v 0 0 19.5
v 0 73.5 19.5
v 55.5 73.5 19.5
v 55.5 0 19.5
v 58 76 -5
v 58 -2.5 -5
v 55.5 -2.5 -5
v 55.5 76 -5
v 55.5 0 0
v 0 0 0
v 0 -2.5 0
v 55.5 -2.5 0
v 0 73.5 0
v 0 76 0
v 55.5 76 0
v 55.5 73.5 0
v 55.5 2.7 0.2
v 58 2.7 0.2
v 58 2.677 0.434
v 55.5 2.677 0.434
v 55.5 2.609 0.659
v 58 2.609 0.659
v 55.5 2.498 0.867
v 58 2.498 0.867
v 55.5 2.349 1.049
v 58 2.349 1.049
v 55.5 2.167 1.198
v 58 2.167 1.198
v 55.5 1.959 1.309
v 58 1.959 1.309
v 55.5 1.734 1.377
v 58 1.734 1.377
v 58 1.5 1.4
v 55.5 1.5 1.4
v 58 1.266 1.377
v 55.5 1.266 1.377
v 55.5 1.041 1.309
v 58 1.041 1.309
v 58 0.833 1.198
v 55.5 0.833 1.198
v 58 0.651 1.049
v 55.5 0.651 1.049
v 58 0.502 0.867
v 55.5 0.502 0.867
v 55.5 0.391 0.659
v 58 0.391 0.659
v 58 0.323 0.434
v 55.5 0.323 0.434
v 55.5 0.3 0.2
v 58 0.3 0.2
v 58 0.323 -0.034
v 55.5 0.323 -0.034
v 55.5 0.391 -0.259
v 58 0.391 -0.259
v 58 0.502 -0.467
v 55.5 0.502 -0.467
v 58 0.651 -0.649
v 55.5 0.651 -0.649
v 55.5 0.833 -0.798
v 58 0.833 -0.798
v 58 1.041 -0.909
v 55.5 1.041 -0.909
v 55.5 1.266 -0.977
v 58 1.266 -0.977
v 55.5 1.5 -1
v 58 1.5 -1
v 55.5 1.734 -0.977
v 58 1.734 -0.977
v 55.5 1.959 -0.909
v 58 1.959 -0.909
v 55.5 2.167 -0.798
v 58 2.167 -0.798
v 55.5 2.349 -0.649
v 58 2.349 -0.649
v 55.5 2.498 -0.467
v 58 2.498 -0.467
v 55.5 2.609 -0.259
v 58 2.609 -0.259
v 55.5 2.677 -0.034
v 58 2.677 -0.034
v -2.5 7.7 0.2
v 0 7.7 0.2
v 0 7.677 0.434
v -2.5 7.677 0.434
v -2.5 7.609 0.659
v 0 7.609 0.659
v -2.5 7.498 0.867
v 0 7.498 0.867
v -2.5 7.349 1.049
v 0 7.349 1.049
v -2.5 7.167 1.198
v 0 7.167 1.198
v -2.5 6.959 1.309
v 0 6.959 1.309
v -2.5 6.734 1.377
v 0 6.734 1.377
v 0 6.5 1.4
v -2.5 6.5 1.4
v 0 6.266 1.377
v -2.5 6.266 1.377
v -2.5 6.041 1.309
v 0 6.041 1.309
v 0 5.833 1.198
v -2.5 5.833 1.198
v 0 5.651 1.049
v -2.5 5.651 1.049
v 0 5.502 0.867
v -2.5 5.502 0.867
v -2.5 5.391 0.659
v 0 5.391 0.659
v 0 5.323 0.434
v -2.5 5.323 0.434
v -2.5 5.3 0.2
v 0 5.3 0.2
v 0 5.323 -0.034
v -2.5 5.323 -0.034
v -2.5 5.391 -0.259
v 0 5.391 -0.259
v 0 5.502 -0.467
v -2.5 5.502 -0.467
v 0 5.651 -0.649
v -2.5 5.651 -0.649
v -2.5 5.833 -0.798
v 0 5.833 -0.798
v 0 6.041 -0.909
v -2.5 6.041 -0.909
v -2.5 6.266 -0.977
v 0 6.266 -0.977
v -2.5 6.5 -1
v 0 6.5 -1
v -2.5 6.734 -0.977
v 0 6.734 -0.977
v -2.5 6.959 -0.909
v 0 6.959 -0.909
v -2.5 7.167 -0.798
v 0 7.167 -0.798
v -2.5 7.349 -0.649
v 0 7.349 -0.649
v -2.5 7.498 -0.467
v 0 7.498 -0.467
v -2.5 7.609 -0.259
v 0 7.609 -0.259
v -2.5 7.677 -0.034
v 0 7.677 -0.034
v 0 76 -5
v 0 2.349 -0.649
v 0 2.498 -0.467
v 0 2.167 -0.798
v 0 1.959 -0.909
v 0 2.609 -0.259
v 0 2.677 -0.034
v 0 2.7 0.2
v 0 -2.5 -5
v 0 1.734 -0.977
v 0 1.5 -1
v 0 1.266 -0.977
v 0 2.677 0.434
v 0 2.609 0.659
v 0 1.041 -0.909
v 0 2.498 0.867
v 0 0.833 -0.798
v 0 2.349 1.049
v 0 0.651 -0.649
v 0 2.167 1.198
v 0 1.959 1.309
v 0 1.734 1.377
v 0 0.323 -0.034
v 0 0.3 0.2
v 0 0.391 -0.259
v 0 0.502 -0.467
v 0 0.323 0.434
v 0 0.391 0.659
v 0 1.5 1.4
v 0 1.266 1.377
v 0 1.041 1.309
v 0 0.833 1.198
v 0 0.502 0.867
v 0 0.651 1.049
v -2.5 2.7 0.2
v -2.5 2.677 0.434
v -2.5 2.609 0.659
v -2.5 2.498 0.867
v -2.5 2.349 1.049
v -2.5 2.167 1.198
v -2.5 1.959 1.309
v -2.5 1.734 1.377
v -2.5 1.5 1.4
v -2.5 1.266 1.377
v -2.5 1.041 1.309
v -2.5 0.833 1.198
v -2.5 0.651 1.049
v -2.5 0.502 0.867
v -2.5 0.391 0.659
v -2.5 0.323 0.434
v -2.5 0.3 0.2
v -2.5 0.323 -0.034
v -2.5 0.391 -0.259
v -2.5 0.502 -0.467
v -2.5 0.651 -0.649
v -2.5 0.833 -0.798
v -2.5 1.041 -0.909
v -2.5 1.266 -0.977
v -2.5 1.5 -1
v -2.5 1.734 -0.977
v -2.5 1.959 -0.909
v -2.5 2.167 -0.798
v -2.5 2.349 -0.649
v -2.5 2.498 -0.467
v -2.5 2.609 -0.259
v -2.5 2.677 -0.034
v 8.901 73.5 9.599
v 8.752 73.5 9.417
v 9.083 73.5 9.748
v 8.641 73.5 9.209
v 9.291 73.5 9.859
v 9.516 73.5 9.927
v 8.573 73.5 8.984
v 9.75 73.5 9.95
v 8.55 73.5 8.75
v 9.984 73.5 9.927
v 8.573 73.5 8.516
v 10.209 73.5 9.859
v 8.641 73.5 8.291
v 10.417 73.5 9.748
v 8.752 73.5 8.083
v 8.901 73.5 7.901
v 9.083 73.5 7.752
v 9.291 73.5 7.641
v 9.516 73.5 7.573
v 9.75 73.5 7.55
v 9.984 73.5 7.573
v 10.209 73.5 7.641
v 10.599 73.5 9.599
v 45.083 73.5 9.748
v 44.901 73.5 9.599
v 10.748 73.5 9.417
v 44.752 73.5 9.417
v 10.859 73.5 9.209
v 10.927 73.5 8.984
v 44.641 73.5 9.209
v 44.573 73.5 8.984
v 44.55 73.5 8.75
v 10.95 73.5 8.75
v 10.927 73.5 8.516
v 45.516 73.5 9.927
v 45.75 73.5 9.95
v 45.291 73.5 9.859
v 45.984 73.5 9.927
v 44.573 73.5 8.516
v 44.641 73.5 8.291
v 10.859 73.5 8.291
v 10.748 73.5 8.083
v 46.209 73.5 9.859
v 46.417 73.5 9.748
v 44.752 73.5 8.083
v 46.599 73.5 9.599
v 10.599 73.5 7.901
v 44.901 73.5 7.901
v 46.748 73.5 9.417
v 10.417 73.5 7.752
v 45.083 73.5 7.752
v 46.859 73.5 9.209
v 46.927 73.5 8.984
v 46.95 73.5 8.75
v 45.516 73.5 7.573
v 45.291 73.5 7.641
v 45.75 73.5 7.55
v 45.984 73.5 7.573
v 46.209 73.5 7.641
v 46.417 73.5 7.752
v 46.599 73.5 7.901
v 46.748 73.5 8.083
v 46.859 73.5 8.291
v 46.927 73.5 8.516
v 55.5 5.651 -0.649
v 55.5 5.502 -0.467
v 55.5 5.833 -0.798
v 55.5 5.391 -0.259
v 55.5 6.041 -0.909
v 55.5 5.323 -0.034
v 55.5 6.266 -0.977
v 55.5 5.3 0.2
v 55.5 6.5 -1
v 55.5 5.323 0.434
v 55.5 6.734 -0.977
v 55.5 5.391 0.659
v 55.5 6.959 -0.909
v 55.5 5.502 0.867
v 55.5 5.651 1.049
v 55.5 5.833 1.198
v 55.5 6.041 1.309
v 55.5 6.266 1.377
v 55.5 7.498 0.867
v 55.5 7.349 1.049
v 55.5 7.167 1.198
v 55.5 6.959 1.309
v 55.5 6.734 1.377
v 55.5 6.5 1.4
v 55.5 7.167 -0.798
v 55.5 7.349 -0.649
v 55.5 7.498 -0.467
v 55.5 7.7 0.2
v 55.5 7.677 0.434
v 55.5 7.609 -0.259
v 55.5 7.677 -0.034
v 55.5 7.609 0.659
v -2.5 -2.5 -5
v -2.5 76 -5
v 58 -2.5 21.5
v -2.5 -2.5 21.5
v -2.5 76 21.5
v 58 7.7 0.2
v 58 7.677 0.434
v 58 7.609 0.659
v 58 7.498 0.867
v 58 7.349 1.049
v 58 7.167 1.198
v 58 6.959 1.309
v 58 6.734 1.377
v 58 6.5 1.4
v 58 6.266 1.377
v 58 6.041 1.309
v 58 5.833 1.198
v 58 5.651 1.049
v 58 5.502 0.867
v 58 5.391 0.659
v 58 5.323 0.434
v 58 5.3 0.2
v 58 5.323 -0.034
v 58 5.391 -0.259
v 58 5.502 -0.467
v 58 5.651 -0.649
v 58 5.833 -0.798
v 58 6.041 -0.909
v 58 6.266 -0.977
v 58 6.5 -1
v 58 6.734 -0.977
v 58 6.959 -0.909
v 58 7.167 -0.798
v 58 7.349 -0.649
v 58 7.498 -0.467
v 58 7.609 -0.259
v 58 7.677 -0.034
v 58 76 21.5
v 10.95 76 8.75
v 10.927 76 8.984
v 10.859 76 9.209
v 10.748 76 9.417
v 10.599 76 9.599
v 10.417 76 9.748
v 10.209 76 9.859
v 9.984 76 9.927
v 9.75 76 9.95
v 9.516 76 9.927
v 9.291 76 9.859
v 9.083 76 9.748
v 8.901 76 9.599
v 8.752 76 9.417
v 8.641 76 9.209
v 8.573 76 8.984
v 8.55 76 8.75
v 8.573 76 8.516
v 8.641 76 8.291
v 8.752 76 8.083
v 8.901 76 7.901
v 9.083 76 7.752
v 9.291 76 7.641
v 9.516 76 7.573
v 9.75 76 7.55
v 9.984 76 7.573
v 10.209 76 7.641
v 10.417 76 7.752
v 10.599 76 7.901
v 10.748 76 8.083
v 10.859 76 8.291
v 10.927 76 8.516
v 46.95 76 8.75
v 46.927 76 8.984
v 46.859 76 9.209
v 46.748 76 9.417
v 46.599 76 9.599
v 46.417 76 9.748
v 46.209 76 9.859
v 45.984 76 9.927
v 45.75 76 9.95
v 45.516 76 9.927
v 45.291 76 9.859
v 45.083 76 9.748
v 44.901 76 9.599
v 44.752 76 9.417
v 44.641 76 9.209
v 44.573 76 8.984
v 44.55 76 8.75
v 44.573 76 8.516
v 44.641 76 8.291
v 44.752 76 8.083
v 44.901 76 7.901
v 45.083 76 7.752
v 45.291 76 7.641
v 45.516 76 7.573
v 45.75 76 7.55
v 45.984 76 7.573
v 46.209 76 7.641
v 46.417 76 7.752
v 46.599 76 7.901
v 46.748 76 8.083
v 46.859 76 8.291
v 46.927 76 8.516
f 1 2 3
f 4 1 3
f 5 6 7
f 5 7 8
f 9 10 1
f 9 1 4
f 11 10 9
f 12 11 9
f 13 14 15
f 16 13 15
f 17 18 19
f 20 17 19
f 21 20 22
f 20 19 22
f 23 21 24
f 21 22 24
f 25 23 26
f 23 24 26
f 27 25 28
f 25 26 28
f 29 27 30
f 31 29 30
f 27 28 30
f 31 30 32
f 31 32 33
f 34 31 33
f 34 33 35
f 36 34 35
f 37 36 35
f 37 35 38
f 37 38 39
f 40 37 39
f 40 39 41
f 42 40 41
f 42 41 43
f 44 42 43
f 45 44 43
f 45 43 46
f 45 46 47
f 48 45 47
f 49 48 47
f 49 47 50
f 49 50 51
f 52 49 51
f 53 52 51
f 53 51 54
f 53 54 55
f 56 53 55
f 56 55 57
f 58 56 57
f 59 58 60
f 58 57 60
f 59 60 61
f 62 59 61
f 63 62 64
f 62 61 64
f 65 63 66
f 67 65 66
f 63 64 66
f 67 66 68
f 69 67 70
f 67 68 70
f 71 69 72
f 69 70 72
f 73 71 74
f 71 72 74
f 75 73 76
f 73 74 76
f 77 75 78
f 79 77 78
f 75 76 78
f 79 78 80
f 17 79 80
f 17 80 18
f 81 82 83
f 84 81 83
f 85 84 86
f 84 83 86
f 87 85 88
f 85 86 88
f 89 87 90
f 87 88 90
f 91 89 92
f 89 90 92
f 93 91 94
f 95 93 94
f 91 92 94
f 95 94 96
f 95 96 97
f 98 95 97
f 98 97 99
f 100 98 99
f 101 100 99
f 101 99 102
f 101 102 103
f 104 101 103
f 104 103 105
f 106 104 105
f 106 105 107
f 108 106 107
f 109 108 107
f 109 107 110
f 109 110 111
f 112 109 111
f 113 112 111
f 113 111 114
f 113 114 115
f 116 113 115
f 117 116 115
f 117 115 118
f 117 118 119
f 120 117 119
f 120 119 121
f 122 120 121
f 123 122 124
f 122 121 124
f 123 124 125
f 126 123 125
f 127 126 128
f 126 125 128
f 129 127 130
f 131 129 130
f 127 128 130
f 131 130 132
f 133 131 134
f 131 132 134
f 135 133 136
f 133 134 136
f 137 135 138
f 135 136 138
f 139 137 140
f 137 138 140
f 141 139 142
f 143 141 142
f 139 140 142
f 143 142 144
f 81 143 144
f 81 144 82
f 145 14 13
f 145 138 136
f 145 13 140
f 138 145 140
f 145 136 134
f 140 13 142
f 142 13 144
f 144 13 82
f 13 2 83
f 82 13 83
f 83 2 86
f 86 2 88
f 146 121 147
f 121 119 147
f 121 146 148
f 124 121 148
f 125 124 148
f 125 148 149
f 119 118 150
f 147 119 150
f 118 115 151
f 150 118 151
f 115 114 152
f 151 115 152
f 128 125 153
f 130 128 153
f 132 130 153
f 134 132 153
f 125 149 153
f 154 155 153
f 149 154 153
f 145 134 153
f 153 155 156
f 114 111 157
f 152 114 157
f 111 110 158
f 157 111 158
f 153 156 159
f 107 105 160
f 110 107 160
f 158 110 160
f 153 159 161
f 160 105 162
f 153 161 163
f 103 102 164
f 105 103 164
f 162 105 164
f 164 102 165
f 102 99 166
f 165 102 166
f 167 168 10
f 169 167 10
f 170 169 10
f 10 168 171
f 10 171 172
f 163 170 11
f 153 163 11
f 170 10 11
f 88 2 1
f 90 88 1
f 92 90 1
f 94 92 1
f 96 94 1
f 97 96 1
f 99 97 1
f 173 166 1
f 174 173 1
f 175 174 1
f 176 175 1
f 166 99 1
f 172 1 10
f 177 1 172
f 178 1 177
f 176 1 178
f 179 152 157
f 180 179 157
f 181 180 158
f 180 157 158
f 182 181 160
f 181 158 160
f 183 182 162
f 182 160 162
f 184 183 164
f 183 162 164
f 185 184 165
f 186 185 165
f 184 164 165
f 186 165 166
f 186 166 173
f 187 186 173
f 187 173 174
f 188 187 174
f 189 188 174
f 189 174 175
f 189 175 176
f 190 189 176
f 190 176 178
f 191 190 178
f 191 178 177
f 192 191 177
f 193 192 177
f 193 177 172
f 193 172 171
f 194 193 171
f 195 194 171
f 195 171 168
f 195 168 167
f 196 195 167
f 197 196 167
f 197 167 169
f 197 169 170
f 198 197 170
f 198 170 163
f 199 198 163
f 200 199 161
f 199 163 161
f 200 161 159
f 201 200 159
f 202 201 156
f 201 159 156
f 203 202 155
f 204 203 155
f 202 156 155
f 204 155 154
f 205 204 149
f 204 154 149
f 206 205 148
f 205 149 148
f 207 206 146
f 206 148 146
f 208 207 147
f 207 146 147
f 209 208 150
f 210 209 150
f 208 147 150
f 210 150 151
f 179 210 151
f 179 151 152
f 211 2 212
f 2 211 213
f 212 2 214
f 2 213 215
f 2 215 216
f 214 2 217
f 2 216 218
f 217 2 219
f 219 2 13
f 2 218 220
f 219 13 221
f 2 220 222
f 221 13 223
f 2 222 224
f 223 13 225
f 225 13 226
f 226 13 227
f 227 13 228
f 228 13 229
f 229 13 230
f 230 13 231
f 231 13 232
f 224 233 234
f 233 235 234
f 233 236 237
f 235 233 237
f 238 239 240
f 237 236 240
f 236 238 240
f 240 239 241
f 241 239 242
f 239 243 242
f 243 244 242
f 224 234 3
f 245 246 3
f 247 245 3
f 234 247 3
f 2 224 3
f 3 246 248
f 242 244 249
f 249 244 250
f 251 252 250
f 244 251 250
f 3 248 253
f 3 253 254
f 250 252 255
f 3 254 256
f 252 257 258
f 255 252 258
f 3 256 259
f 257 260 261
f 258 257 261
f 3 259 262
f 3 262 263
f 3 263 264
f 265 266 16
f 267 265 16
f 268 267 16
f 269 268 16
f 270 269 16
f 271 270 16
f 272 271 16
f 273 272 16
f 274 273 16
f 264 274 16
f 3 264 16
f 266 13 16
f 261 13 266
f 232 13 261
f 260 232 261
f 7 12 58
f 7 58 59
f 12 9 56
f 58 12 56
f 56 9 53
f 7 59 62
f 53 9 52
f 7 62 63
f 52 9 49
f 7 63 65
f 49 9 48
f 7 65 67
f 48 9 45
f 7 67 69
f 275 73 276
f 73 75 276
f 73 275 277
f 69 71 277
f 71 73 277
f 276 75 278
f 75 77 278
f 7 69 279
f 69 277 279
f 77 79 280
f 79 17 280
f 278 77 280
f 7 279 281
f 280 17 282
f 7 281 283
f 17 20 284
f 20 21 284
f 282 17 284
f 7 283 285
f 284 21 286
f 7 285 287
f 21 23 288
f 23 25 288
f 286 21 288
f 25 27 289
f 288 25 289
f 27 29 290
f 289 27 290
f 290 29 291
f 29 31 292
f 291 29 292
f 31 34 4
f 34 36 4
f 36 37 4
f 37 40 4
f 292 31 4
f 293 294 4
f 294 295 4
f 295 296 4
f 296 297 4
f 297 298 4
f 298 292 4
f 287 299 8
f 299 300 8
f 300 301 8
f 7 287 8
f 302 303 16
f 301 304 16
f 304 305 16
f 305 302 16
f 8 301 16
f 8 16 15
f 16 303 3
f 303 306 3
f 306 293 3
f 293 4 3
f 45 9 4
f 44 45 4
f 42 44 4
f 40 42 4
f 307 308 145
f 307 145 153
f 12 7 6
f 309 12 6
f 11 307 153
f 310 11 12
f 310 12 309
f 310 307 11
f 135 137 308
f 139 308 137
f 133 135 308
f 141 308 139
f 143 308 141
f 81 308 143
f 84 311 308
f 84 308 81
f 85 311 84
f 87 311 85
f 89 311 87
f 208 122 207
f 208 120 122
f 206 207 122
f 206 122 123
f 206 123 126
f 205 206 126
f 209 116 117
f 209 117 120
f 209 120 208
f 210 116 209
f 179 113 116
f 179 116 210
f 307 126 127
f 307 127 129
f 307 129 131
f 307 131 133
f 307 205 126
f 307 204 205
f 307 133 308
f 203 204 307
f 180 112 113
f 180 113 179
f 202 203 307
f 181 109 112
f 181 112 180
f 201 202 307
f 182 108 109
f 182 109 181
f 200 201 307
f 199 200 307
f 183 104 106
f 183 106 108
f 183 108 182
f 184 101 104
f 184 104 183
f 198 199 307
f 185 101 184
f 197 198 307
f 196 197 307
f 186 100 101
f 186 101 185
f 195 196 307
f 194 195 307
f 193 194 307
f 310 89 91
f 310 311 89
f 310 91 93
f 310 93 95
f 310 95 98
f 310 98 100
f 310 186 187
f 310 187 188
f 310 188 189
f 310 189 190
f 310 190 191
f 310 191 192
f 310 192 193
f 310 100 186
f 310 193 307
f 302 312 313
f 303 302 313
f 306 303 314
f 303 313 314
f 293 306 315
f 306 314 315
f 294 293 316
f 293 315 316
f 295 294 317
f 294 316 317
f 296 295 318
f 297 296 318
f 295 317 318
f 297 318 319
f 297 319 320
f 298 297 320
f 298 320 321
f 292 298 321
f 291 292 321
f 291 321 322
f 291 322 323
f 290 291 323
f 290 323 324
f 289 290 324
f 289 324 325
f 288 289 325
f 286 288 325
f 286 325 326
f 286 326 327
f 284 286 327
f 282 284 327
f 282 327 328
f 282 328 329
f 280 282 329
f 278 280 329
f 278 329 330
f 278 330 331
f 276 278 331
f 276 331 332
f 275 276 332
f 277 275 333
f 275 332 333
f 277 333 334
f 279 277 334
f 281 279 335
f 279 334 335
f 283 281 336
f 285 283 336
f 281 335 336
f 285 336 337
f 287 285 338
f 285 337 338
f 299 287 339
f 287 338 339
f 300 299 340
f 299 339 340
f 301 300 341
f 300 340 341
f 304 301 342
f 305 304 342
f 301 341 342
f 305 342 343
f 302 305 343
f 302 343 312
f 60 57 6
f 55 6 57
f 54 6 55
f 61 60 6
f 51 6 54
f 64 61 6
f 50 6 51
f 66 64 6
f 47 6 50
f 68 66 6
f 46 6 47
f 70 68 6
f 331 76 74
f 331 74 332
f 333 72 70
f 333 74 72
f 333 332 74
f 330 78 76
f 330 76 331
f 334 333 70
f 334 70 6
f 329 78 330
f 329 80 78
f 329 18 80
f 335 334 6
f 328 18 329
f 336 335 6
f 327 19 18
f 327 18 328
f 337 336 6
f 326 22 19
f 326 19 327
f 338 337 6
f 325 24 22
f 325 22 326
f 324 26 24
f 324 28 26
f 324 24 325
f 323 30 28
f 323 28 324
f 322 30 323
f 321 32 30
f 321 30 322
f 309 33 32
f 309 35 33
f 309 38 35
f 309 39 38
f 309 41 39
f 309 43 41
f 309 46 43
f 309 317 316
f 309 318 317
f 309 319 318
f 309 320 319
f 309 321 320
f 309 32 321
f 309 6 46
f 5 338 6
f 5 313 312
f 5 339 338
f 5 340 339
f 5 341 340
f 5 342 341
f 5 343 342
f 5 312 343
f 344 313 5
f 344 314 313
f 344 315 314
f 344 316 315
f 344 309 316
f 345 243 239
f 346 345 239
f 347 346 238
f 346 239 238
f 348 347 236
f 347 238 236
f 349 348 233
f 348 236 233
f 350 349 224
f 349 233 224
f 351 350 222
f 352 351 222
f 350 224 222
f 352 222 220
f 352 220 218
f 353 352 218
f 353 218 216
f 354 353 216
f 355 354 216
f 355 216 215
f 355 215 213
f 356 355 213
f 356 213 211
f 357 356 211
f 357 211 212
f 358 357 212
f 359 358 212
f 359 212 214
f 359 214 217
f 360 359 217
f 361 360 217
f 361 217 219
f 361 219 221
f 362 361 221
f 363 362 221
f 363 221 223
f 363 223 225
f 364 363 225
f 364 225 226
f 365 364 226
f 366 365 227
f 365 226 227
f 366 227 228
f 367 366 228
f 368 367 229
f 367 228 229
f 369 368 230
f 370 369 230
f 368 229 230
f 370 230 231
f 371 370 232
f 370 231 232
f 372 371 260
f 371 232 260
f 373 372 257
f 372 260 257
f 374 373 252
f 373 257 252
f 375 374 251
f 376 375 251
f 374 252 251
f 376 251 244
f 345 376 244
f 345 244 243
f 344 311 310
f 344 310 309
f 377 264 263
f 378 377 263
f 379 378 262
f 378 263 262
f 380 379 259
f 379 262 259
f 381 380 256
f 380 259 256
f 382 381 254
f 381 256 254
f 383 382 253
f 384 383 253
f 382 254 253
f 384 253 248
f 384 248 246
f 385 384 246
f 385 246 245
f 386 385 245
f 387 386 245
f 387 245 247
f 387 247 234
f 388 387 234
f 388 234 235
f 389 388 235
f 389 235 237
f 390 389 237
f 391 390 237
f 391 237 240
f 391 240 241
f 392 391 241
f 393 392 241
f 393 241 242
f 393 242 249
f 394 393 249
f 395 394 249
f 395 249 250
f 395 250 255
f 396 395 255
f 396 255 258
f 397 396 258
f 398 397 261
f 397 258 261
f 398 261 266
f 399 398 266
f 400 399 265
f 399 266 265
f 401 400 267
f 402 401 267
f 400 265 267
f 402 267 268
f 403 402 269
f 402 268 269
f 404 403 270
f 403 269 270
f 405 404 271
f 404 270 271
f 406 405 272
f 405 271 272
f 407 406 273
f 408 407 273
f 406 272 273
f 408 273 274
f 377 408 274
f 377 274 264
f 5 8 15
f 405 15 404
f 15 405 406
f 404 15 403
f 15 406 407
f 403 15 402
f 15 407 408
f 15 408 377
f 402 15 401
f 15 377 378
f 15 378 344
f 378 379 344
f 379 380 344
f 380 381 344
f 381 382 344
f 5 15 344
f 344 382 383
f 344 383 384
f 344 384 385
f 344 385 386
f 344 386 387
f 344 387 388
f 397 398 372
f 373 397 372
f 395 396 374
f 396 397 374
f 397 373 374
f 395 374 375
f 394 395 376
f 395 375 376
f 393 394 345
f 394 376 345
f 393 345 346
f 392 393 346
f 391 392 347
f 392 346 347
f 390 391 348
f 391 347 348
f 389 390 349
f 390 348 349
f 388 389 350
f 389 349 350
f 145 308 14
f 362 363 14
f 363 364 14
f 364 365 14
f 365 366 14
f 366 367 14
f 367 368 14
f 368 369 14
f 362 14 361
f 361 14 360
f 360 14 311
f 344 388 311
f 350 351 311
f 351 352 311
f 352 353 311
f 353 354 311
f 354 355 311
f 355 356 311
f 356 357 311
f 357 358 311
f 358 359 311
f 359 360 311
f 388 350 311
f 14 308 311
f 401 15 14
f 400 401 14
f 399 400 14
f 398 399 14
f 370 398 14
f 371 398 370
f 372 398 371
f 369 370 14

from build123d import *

# Parameters (mm, degrees)
F1_W      = 60.5
F1_H      = 78.5
F2_DEPTH  = 21.5
F0_W      = 55.5
F0_H      = 73.5
F3_DEPTH  = 19.5
F4_W      = 78.5
F4_H      = 5
F5_DEPTH  = 2.5
F6_R      = 1.2
F7_DEPTH  = 25
F8_W      = 78.5
F8_H      = 5
F9_DEPTH  = 2.5
F10_R     = 1.2
F11_DEPTH = 25
F12_R     = 1.2
F13_DEPTH = 80
F14_W     = 44.0962035209
F14_H     = 7.4383728206
F15_DEPTH = 2.5


with BuildPart() as f2:
    # F1 (on Top) → F2 (new body)
    with BuildSketch(Plane.XY):
        with Locations((27.75, 36.75)):
            Rectangle(F1_W, F1_H)
    extrude(amount=F2_DEPTH)

    # F0 (on Top) → F3 (cut)
    with BuildSketch(Plane.XY):
        with Locations((27.75, 36.75)):
            Rectangle(F0_W, F0_H)
    extrude(amount=F3_DEPTH, mode=Mode.SUBTRACT)

    # F4 (on face) → F5 (join, through all)
    with BuildSketch(Plane.YZ.offset(58)):
        with Locations((36.75, -2.5)):
            Rectangle(F4_W, F4_H)
    extrude(amount=-F5_DEPTH)

    # F6 (on face) → F7 (cut)
    with BuildSketch(Plane.YZ.offset(58)):
        with Locations((1.5, 0.2)):
            Circle(F6_R)
        with Locations((6.5, 0.2)):
            Circle(F6_R)
    extrude(amount=-F7_DEPTH, mode=Mode.SUBTRACT)

    # F8 (on face) → F9 (join, through all)
    with BuildSketch(Plane(origin=(-2.5, 0, 0), x_dir=(0, -1, 0), z_dir=(-1, 0, 0))):
        with Locations((-36.75, -2.5)):
            Rectangle(F8_W, F8_H)
    extrude(amount=-F9_DEPTH)

    # F10 (on Right) → F11 (cut)
    with BuildSketch(Plane.YZ):
        with Locations((1.5, 0.2)):
            Circle(F10_R)
        with Locations((6.5, 0.2)):
            Circle(F10_R)
    extrude(amount=-F11_DEPTH, mode=Mode.SUBTRACT)

    # F12 (on face) → F13 (cut)
    with BuildSketch(Plane.XZ.offset(2.5)):
        with Locations((9.75, 8.75)):
            Circle(F12_R)
        with Locations((45.75, 8.75)):
            Circle(F12_R)
    extrude(amount=-F13_DEPTH, mode=Mode.SUBTRACT)

    # F14 (on face) → F15 (join, through all)
    with BuildSketch(Plane.XZ.offset(2.5)):
        with Locations((27.1060718223, 8.4709739313)):
            Rectangle(F14_W, F14_H)
    extrude(amount=-F15_DEPTH)


solid = f2.part
